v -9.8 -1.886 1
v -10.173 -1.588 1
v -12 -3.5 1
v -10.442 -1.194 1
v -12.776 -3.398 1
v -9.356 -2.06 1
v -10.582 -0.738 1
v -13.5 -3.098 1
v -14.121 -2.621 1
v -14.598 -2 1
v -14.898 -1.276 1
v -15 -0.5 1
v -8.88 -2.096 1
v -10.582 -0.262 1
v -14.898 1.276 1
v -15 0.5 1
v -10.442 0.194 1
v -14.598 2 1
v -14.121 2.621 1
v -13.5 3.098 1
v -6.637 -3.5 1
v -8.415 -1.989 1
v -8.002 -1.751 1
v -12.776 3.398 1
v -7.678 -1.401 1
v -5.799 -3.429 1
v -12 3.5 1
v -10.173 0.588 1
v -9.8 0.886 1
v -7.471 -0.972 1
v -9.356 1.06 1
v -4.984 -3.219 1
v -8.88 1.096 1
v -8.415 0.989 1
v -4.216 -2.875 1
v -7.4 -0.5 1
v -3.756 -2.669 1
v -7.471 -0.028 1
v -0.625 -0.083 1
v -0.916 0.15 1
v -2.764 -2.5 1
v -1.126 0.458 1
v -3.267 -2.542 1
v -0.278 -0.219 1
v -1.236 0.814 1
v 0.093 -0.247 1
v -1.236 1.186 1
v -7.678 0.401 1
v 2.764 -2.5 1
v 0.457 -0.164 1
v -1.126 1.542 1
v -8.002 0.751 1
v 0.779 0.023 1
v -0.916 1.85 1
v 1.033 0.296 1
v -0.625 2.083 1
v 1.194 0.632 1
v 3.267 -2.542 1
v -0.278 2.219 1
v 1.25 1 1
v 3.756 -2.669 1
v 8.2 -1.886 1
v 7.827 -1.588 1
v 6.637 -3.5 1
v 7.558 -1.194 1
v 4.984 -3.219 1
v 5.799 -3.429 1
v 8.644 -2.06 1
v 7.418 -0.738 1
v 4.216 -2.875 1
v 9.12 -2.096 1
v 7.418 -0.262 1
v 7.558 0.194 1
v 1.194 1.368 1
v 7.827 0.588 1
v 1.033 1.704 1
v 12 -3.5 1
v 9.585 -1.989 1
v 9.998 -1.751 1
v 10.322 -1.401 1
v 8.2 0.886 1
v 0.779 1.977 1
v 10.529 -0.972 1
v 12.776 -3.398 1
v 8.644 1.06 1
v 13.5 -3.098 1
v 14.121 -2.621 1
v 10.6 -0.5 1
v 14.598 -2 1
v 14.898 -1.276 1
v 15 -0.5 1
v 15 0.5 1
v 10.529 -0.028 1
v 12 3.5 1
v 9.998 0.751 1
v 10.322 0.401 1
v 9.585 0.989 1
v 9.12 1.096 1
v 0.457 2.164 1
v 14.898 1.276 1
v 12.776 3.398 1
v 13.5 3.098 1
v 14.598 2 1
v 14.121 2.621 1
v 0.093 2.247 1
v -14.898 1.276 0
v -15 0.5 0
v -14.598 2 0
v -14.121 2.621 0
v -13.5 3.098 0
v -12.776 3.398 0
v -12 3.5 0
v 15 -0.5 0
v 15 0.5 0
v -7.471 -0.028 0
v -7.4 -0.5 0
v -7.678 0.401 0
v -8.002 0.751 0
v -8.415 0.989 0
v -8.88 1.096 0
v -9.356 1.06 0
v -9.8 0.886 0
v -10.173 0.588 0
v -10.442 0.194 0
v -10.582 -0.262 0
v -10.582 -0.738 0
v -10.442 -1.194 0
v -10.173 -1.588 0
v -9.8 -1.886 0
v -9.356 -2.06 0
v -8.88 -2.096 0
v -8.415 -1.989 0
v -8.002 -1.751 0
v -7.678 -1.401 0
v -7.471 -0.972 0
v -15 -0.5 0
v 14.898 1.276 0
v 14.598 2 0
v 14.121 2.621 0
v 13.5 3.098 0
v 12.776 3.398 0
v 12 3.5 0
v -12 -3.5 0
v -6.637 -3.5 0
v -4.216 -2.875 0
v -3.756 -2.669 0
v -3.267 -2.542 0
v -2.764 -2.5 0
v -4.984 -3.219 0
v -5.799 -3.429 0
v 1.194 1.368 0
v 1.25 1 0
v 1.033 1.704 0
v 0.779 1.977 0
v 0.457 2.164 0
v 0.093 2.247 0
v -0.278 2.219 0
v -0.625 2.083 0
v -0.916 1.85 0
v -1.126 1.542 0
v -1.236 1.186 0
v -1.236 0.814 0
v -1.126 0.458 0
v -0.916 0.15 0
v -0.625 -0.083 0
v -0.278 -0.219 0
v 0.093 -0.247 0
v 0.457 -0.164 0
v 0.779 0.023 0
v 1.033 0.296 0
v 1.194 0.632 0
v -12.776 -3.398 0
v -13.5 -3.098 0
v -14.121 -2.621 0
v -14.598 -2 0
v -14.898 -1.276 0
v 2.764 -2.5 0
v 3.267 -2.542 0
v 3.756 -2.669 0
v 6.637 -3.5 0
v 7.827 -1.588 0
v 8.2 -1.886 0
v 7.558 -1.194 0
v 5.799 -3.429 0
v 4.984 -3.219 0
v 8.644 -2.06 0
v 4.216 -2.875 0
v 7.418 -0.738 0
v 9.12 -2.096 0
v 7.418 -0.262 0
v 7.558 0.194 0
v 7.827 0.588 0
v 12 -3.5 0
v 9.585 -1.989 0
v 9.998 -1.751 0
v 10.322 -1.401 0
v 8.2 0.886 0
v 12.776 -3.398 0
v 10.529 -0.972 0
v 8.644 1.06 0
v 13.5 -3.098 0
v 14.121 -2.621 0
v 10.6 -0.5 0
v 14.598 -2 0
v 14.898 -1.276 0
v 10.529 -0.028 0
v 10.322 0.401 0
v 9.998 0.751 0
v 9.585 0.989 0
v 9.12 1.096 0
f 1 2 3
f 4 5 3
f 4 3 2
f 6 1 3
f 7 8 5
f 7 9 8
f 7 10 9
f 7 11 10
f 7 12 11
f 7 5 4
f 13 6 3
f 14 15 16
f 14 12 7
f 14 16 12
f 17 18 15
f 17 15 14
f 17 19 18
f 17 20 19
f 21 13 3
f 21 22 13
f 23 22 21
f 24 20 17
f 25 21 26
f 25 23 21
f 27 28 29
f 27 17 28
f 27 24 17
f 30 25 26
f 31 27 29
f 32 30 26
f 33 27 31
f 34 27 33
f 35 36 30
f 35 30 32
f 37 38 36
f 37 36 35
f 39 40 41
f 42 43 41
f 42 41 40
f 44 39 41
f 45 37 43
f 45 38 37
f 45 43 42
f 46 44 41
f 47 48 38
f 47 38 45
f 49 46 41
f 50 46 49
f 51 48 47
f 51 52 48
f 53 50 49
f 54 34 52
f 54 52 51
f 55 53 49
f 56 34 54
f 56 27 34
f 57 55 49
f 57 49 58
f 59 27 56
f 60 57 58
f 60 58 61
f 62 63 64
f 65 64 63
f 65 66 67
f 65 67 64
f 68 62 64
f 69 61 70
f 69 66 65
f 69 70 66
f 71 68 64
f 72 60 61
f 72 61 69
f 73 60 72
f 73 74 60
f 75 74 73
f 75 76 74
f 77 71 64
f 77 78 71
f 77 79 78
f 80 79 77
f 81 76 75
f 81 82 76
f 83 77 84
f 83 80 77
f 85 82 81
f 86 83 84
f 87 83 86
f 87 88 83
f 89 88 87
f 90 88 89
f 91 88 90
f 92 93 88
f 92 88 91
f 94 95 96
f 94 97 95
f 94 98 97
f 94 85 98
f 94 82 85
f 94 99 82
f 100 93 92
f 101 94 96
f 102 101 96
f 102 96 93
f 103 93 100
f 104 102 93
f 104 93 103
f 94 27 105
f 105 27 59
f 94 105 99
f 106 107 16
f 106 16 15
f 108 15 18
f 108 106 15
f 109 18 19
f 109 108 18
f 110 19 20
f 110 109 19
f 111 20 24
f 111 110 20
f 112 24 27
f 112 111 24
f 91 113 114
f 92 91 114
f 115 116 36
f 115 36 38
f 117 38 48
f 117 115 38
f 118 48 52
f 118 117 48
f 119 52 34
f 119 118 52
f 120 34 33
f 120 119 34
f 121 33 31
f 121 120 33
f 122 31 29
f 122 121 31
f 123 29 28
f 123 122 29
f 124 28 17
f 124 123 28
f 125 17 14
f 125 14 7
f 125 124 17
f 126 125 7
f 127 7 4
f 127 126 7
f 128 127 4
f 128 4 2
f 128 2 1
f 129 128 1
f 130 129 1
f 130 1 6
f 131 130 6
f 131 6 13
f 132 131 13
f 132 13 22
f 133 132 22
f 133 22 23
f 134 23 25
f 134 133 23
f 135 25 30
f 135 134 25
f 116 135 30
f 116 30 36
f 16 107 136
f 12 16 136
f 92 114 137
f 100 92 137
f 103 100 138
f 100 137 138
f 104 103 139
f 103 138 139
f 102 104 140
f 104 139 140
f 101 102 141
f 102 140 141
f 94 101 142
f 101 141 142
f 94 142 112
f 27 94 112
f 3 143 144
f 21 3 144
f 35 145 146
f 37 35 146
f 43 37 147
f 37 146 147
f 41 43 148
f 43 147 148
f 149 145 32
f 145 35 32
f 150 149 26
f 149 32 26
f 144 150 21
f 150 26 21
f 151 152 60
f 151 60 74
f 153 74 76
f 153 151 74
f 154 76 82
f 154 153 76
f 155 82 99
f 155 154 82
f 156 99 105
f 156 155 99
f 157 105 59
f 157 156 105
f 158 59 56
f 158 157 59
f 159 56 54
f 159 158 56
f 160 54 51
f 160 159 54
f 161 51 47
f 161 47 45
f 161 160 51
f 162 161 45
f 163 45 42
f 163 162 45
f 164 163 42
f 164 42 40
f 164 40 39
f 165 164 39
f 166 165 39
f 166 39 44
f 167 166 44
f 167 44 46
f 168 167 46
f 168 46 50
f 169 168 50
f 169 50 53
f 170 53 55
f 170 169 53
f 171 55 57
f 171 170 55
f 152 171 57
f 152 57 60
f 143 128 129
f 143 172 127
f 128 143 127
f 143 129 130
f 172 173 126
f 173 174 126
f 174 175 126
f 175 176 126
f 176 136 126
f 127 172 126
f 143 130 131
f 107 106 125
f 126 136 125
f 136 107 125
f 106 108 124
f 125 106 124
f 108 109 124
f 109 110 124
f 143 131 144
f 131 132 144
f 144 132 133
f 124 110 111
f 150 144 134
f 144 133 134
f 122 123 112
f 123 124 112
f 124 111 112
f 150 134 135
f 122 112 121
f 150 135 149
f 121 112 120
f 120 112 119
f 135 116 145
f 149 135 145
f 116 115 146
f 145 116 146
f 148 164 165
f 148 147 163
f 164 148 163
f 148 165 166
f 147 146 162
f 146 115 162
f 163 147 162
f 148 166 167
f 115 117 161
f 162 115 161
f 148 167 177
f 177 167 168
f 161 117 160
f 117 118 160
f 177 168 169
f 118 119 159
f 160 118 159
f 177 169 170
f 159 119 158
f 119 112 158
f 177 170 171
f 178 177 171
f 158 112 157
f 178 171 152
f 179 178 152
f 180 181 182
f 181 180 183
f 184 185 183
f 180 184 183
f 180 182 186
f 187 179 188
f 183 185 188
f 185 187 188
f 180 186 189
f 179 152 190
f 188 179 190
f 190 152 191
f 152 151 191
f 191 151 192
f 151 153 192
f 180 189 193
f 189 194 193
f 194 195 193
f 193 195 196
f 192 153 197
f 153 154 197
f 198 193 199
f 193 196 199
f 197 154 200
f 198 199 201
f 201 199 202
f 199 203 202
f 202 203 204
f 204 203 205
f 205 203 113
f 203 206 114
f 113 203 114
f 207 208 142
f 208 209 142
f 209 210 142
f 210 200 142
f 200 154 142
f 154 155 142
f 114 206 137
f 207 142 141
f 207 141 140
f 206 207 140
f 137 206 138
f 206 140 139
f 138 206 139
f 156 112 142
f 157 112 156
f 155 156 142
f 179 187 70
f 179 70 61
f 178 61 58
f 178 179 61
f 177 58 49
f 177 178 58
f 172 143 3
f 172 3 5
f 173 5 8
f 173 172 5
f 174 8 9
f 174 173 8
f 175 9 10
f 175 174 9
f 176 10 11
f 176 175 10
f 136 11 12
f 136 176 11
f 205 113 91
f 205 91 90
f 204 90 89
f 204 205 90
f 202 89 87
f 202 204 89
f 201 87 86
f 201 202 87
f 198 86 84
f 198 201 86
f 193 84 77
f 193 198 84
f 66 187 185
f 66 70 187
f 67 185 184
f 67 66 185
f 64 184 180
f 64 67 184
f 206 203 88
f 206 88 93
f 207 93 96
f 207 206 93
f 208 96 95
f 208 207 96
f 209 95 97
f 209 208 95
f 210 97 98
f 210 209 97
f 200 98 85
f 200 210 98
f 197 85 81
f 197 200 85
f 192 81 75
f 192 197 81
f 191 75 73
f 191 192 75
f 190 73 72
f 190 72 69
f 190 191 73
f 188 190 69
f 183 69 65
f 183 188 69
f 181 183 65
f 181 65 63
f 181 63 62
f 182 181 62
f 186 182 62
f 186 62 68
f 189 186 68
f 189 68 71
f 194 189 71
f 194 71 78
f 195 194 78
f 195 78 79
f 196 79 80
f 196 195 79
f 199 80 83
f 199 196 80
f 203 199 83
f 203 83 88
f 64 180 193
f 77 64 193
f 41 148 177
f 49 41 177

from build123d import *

# Parameters (mm, degrees)
F0_R         = 1.6
F0_R_2       = 1.25
F1_DEPTH     = 1
F2_T1_DEPTH  = 1
F2_T3_DEPTH  = 1
F2_T5_DEPTH  = 16
F2_T7_DEPTH  = 16
F2_T9_DEPTH  = 16
F2_T11_DEPTH = 16
F3_R         = 5


# Not quite as in the source:
# - a fillet or chamfer that OpenCascade refuses, or shapes differently, is made with other operations: its cross-section is extruded or revolved along the edge and cut away or added


with BuildPart() as f1:
    # F0 (on Top) → F1 (new body)
    with BuildSketch(Plane.XY):
        Polygon((15, -3.5), (15, 3.5), (5, 3.5), (-5, 3.5), (-15, 3.5), (-15, -3.5), (-5, -3.5), (-5, -2.5), (5, -2.5), (5, -3.5), align=None)
        with Locations((-9, -0.5)):
            Circle(F0_R, mode=Mode.SUBTRACT)
        with Locations((9, -0.5)):
            Circle(F0_R, mode=Mode.SUBTRACT)
        with Locations((0, 1)):
            Circle(F0_R_2, mode=Mode.SUBTRACT)
    extrude(amount=F1_DEPTH)

    # F2: fillet of radius 3 on 6 edges, made by hand

    # F2_s2 → F2_t1 (join)
    with BuildSketch(Plane.XY):
        with BuildLine():
            ThreePointArc((5, -3.5), (3.9886768939, -2.7613872125), (2.7639320225, -2.5))
            Line((2.7639320225, -2.5), (5, -2.5))
            Line((5, -2.5), (5, -3.5))
        make_face()
    extrude(amount=F2_T1_DEPTH)

    # F2_s4 → F2_t3 (join)
    with BuildSketch(Plane.XY):
        with BuildLine():
            ThreePointArc((-5, -3.5), (-3.9886768939, -2.7613872125), (-2.7639320225, -2.5))
            Line((-2.7639320225, -2.5), (-5, -2.5))
            Line((-5, -2.5), (-5, -3.5))
        make_face()
    extrude(amount=F2_T3_DEPTH)

    # F2_s6 → F2_t5 (cut)
    with BuildSketch(Plane.XY.offset(-7.5)):
        with BuildLine():
            ThreePointArc((15, -0.5), (14.1213203436, -2.6213203436), (12, -3.5))
            Line((12, -3.5), (15, -3.5))
            Line((15, -3.5), (15, -0.5))
        make_face()
    extrude(amount=F2_T5_DEPTH, mode=Mode.SUBTRACT)

    # F2_s8 → F2_t7 (cut)
    with BuildSketch(Plane.XY.offset(-7.5)):
        with BuildLine():
            ThreePointArc((15, 0.5), (14.1213203436, 2.6213203436), (12, 3.5))
            Line((12, 3.5), (15, 3.5))
            Line((15, 3.5), (15, 0.5))
        make_face()
    extrude(amount=F2_T7_DEPTH, mode=Mode.SUBTRACT)

    # F2_s10 → F2_t9 (cut)
    with BuildSketch(Plane.XY.offset(-7.5)):
        with BuildLine():
            ThreePointArc((-12, -3.5), (-14.1213203436, -2.6213203436), (-15, -0.5))
            Line((-15, -0.5), (-15, -3.5))
            Line((-15, -3.5), (-12, -3.5))
        make_face()
    extrude(amount=F2_T9_DEPTH, mode=Mode.SUBTRACT)

    # F2_s12 → F2_t11 (cut)
    with BuildSketch(Plane.XY.offset(-7.5)):
        with BuildLine():
            ThreePointArc((-15, 0.5), (-14.1213203436, 2.6213203436), (-12, 3.5))
            Line((-12, 3.5), (-15, 3.5))
            Line((-15, 3.5), (-15, 0.5))
        make_face()
    extrude(amount=F2_T11_DEPTH, mode=Mode.SUBTRACT)

    # F3
    f3_edges = [f1.edges().sort_by_distance(p)[0] for p in [
        (-5, -3.5, 0.5),
        (5, -3.5, 0.5),
    ]]
    fillet(f3_edges, radius=F3_R)


solid = f1.part
